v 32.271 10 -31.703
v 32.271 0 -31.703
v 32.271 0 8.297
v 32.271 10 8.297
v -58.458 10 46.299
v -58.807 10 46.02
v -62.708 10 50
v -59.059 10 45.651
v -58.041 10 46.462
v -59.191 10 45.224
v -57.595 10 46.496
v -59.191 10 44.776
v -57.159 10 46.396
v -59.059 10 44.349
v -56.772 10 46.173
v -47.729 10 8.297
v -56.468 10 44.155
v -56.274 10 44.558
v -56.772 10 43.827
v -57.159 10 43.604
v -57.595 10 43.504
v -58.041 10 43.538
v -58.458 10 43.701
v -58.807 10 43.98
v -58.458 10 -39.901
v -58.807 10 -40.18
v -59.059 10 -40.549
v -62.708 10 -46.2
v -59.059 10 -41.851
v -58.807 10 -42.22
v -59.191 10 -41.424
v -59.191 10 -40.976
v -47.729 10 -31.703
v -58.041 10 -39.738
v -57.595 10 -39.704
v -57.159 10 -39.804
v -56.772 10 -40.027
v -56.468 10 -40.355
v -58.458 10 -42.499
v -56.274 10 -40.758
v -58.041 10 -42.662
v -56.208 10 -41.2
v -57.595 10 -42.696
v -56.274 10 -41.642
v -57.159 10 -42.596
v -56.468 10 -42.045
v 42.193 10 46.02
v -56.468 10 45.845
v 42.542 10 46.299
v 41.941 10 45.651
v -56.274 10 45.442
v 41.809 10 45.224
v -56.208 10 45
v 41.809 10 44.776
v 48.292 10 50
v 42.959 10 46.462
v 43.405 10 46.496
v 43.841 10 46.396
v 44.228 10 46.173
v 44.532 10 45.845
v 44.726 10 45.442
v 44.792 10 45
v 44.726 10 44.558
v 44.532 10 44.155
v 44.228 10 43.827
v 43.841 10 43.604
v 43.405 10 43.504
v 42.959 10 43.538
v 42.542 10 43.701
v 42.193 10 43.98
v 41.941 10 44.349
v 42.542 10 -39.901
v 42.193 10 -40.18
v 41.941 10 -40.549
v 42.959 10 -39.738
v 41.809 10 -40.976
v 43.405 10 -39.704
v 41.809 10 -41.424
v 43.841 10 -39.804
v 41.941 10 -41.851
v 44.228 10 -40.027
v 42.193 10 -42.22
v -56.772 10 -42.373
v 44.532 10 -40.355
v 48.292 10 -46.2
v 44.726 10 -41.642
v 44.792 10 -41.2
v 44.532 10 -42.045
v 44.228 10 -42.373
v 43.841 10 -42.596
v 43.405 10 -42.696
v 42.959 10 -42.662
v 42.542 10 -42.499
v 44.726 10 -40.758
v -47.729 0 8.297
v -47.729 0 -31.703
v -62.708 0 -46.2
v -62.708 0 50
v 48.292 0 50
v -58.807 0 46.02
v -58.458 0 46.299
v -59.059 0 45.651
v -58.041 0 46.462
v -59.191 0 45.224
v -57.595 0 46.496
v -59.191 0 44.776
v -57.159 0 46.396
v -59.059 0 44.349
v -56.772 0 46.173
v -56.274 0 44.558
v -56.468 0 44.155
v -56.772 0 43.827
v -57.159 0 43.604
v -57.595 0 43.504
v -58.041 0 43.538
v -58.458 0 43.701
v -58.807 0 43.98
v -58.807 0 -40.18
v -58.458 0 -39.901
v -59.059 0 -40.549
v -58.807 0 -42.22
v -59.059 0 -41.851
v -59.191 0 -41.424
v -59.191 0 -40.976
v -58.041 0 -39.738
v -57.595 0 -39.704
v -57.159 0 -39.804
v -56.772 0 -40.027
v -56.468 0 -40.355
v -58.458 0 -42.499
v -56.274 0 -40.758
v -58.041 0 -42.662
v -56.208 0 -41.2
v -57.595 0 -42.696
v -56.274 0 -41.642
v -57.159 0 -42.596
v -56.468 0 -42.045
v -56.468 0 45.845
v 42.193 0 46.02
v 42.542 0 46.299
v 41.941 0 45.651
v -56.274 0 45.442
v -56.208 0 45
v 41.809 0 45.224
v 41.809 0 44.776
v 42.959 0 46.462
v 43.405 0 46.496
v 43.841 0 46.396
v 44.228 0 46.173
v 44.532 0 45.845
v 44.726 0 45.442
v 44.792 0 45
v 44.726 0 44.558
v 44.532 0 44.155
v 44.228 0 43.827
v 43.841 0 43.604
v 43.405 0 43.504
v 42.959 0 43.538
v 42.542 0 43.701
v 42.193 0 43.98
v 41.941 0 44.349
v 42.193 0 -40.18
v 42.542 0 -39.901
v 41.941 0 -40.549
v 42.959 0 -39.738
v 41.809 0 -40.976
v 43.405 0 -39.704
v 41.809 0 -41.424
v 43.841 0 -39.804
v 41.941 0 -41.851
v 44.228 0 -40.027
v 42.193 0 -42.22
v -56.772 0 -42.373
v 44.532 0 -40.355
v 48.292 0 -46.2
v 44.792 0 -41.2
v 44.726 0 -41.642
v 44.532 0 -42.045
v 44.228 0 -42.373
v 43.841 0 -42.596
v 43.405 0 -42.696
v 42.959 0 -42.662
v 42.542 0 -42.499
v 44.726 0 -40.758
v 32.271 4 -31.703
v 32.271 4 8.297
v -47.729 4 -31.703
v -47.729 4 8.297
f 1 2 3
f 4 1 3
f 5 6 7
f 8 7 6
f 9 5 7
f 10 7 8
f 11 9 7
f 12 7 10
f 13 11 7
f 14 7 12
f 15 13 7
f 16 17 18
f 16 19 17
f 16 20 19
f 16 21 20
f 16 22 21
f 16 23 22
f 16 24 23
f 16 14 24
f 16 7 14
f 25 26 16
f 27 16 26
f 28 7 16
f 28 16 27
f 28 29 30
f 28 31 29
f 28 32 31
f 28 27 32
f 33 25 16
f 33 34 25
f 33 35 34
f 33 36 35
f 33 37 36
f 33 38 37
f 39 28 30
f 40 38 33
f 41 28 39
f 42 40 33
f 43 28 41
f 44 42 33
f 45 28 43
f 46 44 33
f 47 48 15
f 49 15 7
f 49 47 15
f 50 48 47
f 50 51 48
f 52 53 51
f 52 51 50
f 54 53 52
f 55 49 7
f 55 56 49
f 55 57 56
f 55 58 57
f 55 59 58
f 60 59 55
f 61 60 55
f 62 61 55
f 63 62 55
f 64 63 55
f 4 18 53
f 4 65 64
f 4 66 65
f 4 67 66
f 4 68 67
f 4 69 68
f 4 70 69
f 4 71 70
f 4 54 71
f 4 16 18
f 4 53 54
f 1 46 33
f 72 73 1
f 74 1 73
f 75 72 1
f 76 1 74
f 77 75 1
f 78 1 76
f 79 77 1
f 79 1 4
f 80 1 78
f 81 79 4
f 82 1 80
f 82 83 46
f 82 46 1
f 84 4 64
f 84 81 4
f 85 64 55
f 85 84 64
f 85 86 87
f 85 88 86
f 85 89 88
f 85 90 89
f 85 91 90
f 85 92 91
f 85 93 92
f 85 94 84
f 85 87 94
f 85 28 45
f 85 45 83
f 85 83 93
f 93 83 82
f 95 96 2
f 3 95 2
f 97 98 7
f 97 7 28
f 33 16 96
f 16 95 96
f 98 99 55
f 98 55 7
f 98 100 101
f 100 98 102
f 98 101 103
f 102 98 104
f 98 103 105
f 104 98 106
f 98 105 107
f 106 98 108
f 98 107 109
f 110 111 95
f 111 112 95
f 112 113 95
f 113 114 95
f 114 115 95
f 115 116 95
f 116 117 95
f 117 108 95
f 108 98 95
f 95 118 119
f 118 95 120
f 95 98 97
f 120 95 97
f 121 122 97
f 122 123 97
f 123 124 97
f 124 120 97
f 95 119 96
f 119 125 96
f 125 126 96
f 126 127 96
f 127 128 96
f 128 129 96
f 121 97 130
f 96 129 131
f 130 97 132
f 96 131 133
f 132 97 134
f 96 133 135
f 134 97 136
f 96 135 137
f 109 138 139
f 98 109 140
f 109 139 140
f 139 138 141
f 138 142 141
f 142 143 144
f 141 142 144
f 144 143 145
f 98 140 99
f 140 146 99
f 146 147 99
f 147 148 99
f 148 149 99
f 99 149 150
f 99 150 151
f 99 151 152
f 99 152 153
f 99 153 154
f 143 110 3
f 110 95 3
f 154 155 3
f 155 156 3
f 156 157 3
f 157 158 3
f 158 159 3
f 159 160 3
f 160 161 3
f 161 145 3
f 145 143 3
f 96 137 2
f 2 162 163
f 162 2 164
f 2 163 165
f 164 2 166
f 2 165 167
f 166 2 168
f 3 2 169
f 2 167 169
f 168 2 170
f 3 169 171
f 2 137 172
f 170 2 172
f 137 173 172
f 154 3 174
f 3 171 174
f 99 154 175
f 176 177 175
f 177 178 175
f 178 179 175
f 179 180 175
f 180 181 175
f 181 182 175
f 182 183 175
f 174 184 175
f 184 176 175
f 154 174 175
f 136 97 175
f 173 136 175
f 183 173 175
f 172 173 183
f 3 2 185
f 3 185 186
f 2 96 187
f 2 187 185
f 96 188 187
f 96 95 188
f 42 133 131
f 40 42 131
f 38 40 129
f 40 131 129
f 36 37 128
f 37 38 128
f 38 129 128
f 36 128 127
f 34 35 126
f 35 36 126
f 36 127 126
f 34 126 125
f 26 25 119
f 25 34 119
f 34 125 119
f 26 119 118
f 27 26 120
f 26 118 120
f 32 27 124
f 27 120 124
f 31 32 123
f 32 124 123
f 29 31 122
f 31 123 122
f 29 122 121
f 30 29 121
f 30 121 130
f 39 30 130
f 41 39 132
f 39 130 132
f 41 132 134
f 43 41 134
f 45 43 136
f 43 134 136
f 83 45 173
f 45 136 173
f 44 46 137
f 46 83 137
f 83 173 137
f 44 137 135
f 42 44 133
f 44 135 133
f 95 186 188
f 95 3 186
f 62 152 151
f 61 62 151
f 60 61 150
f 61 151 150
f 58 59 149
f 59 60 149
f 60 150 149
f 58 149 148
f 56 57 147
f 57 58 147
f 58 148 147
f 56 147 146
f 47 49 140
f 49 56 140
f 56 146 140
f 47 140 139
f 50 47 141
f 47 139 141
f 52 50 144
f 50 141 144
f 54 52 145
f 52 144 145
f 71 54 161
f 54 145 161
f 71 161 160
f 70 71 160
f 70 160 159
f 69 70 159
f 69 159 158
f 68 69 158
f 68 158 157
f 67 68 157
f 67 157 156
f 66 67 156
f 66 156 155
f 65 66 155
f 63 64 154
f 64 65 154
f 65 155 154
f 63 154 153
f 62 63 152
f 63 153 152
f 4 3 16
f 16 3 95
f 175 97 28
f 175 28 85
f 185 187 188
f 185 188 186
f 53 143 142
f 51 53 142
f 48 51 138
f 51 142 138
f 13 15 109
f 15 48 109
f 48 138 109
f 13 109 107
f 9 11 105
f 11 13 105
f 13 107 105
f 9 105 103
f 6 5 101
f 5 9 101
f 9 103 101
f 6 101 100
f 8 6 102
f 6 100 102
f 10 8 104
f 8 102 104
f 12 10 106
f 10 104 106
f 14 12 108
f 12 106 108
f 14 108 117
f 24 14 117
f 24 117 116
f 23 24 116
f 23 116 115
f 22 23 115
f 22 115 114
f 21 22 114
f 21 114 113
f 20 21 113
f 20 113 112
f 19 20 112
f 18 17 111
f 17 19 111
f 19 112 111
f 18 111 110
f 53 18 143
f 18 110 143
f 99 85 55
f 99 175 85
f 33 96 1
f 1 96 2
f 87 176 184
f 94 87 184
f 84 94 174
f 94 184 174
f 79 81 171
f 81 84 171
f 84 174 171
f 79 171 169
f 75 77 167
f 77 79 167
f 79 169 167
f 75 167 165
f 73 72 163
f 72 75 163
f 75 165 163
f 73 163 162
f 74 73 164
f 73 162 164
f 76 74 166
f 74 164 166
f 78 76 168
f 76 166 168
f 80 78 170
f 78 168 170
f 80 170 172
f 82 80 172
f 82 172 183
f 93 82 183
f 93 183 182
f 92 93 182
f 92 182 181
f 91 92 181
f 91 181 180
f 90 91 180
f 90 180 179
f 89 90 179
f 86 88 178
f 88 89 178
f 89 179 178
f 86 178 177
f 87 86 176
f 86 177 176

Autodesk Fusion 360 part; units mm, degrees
sketch "Sketch1" plane through (0, 0, 0) normal (0, 1, 0) x (1, 0, 0)
  line L0 (48.2925, -50) -> (-62.7075, -50)
  line L1 (-62.7075, -50) -> (-62.7075, 46.2)
  line L2 (-62.7075, 46.2) -> (48.2925, 46.2)
  line L3 (48.2925, 46.2) -> (48.2925, -50)
  circle A0 centre (43.2925, -45) radius 1.5
  circle A1 centre (-57.7075, -45) radius 1.5
  circle A2 centre (-57.7075, 41.2) radius 1.5
  circle A3 centre (43.2925, 41.2) radius 1.5
  line L4 (32.2706, -8.2971) -> (-47.7294, -8.2971)
  line L5 (-47.7294, -8.2971) -> (-47.7294, 31.7029)
  line L6 (-47.7294, 31.7029) -> (32.2706, 31.7029)
  line L7 (32.2706, 31.7029) -> (32.2706, -8.2971)
  dimension "d1" = 111
  dimension "d2" = 96.2
  dimension "d3" = 3
  dimension "d4" = 5
  dimension "d5" = 5
  dimension "d6" = 3
  dimension "d7" = 5
  dimension "d8" = 5
  dimension "d9" = 3
  dimension "d10" = 5
  dimension "d11" = 5
  dimension "d12" = 3
  dimension "d13" = 5
  dimension "d14" = 5
  dimension "d15" = 40
  dimension "d16" = 80
extrude "Extrude1" add sketch "Sketch1" along normal blind 10 makes body 1
extrude "Extrude2" add sketch "Sketch1" along normal blind 4 separate body contours L4 L5 L6 L7 makes body 2
